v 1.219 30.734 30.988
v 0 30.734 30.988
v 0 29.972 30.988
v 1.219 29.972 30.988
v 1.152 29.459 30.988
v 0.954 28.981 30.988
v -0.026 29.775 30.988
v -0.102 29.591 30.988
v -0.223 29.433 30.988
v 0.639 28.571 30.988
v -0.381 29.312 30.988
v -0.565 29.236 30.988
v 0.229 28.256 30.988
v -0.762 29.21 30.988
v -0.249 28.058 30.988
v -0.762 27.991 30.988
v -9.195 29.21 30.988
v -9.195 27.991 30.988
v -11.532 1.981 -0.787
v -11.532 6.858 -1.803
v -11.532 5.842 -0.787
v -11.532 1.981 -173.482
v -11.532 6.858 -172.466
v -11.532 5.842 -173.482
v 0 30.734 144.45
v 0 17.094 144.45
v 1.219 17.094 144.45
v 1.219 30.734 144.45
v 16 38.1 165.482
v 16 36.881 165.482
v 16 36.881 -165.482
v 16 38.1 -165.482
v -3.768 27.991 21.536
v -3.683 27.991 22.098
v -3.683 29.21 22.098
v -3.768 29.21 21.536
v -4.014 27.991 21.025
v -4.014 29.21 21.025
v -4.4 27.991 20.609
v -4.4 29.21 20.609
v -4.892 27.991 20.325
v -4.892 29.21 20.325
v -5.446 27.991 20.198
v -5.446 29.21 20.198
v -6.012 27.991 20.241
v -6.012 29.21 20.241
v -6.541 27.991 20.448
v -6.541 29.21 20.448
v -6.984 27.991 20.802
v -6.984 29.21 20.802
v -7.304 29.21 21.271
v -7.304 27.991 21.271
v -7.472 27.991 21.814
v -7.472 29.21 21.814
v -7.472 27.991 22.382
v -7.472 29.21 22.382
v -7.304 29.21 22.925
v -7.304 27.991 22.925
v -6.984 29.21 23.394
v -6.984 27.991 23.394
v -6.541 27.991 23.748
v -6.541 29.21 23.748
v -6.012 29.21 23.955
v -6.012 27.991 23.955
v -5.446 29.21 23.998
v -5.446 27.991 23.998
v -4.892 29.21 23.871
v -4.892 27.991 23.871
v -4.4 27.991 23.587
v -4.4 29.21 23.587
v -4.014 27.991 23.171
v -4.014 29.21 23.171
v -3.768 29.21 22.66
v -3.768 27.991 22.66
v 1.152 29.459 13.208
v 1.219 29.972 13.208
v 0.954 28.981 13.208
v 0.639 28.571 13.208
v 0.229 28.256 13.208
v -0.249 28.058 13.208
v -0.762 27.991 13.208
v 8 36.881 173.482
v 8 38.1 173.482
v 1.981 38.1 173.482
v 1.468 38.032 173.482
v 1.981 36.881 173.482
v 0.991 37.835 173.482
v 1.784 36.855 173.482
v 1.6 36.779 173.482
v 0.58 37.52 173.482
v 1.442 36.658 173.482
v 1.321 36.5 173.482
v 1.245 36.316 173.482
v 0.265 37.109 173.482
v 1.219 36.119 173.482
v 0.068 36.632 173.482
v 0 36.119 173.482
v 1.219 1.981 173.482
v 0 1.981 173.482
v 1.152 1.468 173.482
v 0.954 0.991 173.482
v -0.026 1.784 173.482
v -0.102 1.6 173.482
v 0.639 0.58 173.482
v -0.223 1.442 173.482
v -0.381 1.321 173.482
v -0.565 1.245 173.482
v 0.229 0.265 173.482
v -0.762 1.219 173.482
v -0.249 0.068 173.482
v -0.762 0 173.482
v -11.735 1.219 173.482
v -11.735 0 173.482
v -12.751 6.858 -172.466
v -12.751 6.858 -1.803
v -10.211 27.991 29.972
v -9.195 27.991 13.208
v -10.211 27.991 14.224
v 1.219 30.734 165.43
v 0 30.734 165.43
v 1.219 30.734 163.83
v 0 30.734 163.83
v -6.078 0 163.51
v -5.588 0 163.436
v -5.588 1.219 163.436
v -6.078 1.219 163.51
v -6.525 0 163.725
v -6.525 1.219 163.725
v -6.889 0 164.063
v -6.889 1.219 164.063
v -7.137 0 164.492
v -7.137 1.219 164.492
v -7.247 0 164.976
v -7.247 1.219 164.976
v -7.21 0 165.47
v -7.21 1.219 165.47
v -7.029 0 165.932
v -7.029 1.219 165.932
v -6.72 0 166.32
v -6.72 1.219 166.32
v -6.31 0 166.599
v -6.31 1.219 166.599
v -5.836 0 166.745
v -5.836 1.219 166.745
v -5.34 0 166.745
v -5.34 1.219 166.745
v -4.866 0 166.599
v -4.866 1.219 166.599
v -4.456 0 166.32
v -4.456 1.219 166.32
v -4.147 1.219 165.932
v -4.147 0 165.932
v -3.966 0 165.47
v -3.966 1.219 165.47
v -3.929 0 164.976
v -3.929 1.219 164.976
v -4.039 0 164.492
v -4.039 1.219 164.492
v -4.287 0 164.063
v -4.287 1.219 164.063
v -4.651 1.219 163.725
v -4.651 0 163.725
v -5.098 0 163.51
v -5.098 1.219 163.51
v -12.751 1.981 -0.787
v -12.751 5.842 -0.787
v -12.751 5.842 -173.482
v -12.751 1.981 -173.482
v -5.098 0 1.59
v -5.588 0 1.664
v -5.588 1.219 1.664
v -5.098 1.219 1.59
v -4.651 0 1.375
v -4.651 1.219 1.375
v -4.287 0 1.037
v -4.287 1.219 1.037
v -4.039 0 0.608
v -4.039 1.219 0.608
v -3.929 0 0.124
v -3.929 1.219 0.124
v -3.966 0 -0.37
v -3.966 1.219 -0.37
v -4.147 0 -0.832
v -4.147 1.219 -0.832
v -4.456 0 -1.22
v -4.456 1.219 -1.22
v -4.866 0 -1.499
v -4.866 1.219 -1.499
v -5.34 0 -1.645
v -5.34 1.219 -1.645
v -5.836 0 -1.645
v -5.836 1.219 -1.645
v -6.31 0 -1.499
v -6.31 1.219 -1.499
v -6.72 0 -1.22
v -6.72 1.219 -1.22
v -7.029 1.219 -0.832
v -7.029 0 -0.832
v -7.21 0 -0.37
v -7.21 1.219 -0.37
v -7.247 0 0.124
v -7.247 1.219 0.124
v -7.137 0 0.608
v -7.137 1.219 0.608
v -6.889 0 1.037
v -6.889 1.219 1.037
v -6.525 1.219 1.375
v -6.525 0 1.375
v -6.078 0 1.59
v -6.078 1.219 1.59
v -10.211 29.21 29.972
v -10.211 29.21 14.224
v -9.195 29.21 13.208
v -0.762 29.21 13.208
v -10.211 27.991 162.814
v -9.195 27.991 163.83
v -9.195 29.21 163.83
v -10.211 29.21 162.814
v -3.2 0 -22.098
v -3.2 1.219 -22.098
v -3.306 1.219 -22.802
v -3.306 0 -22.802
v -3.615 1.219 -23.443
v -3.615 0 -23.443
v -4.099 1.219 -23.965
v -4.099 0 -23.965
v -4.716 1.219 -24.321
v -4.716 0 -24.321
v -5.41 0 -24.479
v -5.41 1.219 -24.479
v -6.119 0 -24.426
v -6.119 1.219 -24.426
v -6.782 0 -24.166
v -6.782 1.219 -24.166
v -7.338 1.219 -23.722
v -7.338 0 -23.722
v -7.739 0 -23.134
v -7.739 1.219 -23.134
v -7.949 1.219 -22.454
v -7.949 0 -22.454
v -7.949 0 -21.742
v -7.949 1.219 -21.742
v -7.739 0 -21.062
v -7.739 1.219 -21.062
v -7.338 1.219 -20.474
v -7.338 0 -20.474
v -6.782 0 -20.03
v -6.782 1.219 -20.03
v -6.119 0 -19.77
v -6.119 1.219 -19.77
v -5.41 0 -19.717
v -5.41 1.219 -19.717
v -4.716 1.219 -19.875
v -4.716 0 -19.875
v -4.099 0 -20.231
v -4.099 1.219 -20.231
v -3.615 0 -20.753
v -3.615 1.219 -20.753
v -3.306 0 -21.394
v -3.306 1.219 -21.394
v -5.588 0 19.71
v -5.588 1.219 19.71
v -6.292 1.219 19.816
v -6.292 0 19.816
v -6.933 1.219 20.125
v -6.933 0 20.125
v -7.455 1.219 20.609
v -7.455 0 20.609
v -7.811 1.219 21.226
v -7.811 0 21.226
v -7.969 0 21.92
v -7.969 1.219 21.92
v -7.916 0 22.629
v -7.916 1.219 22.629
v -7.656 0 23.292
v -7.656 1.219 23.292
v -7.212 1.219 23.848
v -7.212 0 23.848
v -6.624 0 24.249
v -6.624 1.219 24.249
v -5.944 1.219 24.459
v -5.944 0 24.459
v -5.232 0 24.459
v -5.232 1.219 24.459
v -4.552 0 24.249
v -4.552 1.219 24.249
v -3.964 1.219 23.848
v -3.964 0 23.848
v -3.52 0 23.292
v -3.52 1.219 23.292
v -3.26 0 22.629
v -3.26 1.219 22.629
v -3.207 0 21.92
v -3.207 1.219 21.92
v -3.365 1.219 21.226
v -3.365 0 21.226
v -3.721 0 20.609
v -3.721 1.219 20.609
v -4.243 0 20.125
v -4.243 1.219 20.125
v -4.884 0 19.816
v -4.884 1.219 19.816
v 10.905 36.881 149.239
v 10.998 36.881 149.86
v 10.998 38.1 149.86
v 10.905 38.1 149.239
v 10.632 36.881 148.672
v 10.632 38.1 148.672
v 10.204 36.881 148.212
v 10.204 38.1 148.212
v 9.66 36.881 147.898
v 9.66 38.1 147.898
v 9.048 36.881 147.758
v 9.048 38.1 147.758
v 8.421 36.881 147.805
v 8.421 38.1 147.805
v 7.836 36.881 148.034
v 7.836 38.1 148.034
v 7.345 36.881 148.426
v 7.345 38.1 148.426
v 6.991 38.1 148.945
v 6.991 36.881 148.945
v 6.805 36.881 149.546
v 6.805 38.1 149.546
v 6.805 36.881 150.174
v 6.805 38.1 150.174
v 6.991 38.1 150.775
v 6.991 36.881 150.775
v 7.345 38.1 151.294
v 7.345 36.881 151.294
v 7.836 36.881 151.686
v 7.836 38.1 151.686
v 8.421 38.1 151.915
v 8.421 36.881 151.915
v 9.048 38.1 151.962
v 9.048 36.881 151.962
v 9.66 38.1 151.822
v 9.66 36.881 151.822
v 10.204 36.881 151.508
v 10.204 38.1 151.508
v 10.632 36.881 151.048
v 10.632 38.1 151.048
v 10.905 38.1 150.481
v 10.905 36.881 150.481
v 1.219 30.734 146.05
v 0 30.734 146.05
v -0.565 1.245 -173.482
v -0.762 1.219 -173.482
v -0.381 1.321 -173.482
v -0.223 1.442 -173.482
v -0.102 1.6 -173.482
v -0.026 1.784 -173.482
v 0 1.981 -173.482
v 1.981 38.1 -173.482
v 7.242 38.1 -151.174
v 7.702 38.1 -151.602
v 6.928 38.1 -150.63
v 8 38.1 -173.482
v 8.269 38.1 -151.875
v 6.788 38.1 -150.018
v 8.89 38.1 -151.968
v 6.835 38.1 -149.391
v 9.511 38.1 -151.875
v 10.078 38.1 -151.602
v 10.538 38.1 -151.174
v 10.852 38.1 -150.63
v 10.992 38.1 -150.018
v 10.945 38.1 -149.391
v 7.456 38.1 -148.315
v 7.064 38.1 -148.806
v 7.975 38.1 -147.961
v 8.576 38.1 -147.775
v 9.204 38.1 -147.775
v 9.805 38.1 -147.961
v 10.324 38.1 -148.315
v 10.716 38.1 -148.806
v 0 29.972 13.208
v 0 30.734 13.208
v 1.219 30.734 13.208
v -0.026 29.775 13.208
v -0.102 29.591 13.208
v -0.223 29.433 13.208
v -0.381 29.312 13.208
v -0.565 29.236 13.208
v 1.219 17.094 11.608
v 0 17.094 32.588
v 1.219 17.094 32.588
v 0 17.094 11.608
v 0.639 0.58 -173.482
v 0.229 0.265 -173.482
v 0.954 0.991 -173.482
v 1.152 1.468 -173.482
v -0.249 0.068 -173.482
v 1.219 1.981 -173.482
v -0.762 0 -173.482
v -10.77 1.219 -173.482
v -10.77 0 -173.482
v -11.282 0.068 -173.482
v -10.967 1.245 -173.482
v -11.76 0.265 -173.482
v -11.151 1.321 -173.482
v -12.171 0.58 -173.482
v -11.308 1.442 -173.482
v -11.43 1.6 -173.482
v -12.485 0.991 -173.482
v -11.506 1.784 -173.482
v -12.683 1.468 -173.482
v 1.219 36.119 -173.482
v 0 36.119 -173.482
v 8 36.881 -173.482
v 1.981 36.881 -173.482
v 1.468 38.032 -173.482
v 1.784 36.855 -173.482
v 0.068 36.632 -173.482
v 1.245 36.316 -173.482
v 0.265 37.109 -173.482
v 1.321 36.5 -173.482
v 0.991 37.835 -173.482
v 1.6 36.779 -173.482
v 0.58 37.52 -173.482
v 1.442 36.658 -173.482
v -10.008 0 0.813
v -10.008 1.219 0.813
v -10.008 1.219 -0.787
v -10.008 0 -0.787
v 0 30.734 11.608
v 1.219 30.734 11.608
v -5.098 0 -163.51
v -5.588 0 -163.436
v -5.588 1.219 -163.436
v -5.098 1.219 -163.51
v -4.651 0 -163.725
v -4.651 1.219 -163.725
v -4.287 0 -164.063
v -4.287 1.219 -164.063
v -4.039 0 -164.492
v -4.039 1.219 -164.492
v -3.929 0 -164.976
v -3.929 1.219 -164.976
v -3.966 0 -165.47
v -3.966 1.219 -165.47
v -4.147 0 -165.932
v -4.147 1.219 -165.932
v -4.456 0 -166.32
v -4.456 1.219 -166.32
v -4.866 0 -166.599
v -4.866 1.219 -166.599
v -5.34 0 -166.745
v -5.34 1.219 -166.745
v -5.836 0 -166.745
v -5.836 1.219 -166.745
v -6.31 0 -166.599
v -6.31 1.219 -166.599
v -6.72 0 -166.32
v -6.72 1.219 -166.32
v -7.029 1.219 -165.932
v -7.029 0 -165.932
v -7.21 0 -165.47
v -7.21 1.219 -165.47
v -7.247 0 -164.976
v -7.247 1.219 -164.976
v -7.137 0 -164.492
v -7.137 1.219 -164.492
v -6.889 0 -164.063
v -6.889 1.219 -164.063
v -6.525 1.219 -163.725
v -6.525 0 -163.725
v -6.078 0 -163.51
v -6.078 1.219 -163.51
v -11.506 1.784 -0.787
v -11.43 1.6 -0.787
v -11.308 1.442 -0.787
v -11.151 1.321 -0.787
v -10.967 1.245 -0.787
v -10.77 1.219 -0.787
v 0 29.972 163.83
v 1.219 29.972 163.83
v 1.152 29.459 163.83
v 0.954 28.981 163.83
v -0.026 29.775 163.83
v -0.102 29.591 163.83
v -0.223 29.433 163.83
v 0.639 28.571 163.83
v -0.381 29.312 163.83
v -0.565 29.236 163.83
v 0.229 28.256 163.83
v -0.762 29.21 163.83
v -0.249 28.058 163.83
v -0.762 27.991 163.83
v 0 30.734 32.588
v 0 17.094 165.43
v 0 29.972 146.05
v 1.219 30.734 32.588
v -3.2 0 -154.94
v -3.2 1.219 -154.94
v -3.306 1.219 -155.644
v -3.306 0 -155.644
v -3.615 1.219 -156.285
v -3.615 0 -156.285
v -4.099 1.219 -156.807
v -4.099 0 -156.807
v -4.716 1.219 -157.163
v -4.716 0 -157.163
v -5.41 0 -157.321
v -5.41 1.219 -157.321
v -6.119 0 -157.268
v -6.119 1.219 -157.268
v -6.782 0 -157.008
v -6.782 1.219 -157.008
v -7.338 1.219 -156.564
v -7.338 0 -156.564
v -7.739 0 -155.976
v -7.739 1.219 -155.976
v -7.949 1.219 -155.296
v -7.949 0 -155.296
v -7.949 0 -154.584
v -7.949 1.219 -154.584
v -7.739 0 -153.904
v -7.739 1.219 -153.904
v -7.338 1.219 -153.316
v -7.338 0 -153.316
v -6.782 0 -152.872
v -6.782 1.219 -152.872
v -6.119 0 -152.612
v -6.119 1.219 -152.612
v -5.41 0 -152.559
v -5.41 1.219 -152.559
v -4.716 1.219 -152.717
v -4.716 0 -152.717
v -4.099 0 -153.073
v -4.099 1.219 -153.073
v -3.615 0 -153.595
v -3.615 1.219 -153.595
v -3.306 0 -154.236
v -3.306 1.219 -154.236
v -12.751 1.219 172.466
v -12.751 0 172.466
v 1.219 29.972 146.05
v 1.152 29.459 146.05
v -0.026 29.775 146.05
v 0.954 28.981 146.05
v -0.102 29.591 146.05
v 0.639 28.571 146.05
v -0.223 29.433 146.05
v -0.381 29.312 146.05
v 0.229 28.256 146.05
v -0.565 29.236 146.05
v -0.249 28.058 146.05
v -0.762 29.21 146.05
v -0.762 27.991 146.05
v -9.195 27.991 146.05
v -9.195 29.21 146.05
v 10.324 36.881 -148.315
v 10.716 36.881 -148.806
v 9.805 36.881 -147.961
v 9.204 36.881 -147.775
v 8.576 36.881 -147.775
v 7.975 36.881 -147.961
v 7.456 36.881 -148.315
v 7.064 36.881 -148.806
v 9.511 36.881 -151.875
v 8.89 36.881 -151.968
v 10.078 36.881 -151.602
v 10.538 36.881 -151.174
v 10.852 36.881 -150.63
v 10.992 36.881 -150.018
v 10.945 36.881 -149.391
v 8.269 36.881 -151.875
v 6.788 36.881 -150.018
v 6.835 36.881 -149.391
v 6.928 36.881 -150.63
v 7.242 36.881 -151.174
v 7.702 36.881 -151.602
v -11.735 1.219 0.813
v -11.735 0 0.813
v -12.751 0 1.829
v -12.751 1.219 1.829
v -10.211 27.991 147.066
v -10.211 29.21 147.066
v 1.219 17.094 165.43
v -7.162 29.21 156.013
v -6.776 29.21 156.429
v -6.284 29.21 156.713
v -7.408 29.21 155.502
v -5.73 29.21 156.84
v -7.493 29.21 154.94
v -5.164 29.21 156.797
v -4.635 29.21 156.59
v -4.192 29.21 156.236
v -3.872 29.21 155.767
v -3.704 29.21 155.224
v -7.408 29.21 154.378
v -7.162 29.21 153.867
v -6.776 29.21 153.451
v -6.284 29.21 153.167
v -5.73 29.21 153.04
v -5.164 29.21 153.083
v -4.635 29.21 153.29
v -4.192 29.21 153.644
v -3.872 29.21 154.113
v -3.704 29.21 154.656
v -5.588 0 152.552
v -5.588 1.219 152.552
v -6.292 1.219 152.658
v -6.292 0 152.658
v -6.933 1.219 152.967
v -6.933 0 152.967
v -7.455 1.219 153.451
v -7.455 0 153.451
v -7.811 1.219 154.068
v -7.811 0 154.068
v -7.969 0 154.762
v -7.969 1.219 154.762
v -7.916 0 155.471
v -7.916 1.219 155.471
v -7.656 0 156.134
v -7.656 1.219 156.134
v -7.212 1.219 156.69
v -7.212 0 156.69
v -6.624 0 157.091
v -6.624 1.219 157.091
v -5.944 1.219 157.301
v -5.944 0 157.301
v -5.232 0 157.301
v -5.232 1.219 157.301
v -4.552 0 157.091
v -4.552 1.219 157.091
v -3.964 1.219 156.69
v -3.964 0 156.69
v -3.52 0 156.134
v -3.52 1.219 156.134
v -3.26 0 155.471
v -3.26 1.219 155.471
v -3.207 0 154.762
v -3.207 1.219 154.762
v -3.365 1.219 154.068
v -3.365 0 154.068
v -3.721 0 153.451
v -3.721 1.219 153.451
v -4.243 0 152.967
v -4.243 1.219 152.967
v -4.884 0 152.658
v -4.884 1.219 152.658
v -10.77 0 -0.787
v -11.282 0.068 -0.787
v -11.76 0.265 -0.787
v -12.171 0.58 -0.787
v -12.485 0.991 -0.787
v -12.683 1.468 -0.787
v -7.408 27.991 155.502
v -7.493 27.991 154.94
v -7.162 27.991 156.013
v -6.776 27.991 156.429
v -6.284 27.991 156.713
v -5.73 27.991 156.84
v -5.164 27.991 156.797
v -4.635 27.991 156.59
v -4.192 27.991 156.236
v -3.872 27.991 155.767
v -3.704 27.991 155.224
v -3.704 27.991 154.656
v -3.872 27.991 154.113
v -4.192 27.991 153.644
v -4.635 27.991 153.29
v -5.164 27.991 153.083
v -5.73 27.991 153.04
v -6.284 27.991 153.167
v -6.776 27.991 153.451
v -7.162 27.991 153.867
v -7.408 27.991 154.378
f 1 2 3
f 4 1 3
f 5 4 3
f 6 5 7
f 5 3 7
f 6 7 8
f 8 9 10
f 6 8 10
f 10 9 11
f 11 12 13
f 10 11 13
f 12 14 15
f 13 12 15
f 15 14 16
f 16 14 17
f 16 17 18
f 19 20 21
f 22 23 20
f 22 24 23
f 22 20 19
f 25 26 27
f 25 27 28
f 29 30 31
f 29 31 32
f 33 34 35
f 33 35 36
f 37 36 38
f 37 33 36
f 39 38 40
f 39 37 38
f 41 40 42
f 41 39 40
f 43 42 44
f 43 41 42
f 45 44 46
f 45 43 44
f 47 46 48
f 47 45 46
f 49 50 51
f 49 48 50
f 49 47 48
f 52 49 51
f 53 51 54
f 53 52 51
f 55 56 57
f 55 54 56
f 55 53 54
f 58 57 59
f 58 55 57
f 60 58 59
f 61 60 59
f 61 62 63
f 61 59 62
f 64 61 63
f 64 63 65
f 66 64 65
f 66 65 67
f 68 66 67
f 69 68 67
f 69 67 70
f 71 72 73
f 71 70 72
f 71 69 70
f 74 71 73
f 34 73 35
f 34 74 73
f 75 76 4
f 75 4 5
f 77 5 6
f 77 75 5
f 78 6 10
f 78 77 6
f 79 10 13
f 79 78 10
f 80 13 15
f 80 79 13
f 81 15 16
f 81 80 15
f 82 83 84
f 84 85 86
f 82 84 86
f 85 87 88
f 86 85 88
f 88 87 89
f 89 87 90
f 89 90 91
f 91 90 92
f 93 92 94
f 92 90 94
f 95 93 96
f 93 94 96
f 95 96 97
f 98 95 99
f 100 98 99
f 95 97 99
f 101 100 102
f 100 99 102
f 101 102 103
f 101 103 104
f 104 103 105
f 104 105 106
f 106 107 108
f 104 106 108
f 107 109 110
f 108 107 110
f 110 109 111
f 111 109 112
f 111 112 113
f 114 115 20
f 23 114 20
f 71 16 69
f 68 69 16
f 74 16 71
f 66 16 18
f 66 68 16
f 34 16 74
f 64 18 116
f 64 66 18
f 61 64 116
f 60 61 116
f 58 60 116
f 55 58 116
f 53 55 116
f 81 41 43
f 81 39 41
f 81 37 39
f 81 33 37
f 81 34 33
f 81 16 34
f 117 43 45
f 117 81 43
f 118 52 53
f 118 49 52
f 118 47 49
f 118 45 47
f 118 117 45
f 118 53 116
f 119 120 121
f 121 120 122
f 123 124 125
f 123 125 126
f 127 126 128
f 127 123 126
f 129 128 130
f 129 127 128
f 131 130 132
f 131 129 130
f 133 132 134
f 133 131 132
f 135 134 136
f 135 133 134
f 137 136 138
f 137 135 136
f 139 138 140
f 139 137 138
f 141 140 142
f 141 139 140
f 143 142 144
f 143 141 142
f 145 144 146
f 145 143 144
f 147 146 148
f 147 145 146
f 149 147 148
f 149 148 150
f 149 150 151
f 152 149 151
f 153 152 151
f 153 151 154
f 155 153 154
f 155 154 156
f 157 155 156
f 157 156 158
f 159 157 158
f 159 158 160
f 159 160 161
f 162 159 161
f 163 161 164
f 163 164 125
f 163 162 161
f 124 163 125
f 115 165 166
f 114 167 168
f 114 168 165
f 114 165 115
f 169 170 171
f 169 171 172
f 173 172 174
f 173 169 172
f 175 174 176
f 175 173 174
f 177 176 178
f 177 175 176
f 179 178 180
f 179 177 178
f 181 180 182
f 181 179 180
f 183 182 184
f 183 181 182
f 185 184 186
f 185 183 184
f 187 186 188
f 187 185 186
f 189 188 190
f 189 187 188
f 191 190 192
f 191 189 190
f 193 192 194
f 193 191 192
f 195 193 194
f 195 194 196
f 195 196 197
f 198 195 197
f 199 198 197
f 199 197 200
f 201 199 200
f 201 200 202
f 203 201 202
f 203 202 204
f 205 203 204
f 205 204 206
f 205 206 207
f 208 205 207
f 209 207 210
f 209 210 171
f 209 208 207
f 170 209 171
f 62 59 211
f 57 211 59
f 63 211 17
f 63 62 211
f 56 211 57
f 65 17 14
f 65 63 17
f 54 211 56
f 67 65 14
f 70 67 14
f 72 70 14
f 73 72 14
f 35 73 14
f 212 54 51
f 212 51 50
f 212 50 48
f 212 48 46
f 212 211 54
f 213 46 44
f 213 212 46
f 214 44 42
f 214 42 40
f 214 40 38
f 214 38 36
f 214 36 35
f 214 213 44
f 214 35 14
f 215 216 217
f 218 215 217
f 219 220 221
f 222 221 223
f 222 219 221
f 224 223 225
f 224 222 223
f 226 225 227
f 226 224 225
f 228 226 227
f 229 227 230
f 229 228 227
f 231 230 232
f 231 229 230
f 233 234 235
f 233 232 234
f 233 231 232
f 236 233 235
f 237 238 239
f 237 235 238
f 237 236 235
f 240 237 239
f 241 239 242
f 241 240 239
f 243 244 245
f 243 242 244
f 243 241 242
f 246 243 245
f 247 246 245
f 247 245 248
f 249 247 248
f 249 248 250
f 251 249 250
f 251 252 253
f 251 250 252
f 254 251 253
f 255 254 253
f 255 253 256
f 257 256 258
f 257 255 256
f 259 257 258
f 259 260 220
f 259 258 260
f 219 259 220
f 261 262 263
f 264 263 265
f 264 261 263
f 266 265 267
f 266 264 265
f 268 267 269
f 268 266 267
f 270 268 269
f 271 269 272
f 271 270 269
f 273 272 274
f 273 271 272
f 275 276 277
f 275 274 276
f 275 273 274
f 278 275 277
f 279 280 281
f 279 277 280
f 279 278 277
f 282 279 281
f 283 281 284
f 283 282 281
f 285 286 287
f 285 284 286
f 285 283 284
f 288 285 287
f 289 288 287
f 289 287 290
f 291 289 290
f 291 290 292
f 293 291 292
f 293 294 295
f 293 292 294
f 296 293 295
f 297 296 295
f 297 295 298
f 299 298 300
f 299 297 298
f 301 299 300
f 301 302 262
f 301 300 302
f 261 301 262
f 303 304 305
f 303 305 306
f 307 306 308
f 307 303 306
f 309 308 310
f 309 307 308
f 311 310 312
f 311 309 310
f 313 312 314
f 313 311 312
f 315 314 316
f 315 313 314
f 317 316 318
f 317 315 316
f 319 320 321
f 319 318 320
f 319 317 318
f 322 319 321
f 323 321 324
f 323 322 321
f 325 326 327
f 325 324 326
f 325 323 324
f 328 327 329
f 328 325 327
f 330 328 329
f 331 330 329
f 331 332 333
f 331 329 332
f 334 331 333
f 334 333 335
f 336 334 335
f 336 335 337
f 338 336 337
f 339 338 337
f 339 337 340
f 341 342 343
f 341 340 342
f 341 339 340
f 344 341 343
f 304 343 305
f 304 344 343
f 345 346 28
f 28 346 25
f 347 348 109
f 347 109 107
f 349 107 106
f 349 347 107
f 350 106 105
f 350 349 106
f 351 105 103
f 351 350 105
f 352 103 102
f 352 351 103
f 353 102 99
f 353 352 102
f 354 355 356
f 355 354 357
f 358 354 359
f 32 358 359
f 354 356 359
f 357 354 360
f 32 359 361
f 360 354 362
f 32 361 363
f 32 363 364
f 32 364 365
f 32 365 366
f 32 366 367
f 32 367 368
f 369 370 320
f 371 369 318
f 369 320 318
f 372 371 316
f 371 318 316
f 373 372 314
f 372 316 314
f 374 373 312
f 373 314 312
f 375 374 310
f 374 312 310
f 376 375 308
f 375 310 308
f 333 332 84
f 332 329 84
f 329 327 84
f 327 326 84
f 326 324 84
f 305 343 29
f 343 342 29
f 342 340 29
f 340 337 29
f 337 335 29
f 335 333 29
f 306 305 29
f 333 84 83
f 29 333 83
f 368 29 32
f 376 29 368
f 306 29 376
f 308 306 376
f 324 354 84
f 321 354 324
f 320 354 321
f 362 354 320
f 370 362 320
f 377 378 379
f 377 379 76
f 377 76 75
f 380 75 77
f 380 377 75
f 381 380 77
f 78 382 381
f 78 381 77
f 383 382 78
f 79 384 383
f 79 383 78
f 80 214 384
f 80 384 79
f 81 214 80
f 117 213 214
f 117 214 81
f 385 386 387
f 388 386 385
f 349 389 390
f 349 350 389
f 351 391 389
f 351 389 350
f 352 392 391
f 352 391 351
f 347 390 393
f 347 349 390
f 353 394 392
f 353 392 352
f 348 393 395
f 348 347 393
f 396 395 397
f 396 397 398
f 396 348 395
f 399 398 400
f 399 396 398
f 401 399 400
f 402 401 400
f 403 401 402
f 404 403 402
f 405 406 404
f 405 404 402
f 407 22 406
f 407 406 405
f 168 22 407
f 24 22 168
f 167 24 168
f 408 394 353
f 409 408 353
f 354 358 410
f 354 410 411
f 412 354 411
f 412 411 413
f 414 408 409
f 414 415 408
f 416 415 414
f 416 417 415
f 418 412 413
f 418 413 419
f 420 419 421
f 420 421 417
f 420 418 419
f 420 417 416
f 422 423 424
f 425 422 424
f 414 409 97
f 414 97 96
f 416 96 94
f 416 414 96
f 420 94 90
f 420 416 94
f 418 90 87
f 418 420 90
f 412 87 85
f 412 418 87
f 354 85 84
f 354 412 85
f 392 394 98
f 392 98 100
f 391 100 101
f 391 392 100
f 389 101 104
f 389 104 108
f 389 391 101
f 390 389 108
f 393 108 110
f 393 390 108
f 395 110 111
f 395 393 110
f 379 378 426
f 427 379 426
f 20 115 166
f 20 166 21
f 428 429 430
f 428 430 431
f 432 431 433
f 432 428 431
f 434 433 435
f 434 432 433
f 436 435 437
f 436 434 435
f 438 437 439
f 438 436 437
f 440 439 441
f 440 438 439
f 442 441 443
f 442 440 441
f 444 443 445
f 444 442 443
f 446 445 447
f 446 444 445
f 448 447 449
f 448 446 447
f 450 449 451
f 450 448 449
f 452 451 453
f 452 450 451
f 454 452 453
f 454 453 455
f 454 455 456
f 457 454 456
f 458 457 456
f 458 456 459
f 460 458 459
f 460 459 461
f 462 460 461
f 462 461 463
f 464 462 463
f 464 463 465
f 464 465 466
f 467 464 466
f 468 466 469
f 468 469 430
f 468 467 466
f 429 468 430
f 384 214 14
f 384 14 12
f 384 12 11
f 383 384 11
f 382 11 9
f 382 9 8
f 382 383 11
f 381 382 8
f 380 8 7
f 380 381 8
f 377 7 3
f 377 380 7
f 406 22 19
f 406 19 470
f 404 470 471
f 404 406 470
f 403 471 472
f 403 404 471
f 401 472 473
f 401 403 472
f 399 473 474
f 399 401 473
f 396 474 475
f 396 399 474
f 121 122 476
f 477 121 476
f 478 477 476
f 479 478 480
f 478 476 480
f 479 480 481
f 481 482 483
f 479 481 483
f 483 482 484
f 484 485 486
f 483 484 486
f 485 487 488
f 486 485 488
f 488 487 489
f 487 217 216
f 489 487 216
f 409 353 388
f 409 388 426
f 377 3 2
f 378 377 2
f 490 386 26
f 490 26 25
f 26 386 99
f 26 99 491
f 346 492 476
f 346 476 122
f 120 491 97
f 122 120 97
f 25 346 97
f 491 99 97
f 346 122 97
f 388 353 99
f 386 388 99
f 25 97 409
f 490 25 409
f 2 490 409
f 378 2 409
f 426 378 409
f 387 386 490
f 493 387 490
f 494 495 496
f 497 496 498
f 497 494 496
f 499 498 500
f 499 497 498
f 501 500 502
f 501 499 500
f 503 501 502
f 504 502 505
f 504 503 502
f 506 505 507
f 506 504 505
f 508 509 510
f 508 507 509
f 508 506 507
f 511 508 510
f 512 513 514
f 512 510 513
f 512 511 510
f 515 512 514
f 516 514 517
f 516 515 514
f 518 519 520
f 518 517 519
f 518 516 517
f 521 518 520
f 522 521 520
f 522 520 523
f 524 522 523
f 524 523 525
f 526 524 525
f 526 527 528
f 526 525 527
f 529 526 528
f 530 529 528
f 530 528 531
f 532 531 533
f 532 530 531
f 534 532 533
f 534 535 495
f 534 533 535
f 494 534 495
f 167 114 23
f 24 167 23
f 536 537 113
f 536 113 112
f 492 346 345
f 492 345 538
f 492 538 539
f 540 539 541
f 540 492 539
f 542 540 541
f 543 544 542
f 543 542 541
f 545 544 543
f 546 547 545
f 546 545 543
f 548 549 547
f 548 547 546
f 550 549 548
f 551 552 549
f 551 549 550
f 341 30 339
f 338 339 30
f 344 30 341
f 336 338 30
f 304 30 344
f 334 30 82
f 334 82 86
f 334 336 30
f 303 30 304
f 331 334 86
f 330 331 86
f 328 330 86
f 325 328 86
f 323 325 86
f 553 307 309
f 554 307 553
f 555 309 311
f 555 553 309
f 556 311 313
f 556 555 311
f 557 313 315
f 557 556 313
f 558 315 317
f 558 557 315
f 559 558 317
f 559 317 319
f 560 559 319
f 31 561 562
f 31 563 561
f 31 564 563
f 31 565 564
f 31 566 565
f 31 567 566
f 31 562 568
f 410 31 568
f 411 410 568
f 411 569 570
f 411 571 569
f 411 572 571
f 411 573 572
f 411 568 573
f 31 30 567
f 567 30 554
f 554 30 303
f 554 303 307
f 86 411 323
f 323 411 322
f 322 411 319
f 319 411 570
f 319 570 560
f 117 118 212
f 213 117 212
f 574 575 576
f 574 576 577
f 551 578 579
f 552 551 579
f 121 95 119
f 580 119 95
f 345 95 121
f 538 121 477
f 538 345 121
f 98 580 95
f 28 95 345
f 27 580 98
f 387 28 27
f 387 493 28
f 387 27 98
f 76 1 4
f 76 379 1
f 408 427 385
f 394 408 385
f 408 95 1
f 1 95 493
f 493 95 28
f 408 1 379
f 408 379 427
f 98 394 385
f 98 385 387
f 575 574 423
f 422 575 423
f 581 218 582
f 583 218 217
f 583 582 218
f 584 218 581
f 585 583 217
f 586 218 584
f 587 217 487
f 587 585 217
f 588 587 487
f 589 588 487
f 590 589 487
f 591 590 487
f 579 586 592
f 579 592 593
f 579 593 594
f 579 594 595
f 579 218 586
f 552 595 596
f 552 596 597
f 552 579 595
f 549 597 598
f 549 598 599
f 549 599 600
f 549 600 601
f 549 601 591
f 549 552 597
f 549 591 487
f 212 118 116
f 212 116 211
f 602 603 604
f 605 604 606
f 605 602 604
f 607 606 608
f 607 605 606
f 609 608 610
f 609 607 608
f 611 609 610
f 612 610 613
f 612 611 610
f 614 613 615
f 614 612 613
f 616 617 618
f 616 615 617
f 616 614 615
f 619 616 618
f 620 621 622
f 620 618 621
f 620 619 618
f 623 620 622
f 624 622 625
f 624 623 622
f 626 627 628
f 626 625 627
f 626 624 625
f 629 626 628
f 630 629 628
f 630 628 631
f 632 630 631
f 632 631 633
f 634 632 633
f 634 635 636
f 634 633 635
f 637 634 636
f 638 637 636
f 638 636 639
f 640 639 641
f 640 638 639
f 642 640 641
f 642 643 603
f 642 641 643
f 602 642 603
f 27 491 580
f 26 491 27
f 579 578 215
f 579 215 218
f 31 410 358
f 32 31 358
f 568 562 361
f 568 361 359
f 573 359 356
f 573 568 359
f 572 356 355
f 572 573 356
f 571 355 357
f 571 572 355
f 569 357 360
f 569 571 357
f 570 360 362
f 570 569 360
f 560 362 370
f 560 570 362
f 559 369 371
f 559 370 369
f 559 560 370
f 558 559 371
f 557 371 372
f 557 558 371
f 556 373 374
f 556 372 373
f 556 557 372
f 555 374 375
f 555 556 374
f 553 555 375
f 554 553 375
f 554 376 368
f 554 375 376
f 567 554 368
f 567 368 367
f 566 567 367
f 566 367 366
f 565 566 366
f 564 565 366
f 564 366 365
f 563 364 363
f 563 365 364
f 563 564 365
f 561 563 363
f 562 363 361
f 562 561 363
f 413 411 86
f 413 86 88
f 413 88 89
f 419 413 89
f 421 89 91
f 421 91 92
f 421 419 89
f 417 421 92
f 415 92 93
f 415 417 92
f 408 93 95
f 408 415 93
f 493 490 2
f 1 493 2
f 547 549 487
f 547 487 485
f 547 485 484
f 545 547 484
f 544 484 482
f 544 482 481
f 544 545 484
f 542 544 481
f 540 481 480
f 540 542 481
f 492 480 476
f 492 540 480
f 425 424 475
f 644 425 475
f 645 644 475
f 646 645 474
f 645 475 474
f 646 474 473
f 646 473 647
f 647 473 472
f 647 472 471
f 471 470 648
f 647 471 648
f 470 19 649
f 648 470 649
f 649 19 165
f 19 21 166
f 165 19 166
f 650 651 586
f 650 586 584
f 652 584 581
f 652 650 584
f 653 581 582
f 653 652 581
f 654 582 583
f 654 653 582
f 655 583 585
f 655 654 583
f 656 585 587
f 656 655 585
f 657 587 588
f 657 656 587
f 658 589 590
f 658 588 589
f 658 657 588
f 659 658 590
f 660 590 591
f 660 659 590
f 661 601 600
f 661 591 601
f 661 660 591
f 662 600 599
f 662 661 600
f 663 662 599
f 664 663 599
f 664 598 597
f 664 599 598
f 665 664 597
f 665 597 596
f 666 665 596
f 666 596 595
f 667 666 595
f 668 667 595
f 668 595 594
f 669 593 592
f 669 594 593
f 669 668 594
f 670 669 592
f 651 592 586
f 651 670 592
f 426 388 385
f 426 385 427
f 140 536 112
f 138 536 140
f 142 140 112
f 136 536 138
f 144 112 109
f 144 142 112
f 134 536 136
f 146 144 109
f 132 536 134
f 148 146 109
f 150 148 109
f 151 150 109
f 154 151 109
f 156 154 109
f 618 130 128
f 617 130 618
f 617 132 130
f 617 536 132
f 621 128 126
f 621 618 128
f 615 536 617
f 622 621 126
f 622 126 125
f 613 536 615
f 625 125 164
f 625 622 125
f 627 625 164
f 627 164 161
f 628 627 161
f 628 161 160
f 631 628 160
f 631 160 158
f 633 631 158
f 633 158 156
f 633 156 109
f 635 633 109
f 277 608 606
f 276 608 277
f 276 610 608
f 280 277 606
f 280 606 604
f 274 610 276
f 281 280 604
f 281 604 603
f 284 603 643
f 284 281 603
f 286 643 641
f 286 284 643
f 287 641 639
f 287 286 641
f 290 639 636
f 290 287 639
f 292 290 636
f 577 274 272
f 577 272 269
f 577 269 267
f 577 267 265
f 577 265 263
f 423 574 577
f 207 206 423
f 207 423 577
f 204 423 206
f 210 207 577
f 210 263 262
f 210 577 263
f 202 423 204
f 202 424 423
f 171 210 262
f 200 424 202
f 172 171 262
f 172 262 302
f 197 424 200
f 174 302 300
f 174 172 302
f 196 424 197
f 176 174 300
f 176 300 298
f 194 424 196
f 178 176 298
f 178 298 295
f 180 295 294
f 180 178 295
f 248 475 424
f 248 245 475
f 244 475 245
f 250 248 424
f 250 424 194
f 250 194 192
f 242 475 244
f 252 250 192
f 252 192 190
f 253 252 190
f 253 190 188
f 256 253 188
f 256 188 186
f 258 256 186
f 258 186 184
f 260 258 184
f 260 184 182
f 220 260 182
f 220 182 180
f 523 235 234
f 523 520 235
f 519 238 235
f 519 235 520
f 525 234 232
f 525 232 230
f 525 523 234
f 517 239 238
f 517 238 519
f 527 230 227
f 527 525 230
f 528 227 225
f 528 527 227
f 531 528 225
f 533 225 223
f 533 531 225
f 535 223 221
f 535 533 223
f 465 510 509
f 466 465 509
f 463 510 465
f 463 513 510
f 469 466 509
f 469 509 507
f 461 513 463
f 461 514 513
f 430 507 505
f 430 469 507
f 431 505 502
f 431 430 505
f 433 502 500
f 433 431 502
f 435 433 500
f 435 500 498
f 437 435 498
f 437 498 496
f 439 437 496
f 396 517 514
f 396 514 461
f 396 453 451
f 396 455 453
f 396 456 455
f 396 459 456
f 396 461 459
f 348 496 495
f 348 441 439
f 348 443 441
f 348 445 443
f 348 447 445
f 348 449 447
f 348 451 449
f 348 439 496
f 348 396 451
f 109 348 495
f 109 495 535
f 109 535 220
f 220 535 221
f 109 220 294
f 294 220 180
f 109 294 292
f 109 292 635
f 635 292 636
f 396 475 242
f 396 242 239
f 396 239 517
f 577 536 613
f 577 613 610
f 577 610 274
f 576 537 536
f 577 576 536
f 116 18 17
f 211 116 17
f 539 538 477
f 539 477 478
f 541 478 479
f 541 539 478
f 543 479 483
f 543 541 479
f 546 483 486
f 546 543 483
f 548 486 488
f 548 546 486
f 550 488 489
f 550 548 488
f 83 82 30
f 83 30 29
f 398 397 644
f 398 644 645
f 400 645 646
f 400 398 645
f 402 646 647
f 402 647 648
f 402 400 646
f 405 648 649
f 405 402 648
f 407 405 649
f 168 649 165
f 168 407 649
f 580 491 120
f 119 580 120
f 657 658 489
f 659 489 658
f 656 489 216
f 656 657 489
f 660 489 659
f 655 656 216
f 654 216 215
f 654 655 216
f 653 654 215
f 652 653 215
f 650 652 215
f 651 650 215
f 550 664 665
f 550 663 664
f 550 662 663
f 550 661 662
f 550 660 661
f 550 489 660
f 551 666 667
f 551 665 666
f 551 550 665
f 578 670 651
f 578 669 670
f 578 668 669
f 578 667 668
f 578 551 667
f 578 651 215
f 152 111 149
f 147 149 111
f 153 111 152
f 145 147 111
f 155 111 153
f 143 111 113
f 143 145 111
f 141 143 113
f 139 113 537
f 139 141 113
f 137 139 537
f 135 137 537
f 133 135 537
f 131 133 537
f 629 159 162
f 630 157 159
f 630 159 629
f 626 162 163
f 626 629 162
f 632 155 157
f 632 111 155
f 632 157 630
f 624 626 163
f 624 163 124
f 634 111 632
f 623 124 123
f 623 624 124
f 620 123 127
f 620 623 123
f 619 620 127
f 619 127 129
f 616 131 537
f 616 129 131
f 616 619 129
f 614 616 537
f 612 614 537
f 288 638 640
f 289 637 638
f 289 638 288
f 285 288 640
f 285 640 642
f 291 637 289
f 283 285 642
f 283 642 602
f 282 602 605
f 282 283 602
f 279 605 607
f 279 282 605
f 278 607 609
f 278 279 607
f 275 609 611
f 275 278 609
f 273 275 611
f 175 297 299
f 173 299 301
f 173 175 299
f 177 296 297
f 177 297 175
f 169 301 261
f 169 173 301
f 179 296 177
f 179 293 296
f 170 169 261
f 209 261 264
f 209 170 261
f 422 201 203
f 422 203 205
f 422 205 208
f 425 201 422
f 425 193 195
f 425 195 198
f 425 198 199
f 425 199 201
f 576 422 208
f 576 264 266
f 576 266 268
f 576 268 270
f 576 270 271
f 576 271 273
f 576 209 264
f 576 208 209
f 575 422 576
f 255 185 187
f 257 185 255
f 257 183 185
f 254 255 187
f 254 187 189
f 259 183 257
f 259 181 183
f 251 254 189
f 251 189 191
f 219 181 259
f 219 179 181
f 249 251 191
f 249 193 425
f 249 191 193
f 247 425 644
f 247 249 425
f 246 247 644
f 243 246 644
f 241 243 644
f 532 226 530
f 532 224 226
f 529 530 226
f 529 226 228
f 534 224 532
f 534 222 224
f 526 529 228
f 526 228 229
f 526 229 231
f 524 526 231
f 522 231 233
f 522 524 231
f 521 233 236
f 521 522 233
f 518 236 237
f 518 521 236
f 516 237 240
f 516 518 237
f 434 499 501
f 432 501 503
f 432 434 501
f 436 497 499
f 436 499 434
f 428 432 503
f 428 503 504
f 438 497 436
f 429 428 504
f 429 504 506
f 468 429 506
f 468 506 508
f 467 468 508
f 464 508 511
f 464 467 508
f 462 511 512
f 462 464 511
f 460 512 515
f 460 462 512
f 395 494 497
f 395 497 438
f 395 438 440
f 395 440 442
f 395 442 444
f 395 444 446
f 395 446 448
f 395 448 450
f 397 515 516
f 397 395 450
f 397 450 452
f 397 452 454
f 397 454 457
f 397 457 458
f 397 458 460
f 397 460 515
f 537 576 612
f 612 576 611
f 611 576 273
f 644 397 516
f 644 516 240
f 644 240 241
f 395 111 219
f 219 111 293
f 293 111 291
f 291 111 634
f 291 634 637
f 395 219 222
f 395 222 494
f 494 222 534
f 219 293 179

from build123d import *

# Parameters (mm, degrees)
SKETCH2_W                            = 16
SKETCH2_H                            = 38.1
BOSS_EXTRUDE1_DEPTH                  = 173.482
CONVERT_SOLID1_START                 = -173.482
CONVERT_SOLID1_DEPTH                 = 346.964
EDGE_FLANGE2_STRIP_W                 = 6.4008
EDGE_FLANGE2_STRIP_H                 = 1.2192
EDGE_FLANGE2_STRIP_CUT_DEPTH         = 346.964
EDGE_FLANGE2_DEPTH                   = 346.964
EDGE_FLANGE3_STRIP_W                 = 6.4008
EDGE_FLANGE3_STRIP_H                 = 1.2192
EDGE_FLANGE3_STRIP_CUT_DEPTH         = 172.6946
EDGE_FLANGE3_RELIEF_W                = 7.1628
EDGE_FLANGE3_RELIEF_H                = 1.6002
EDGE_FLANGE3_RELIEF_CUT_DEPTH        = 1.2192
EDGE_FLANGE3_DEPTH                   = 172.6946
PEM_CLEARANCE_HOLES_R                = 2.3876
CUT_EXTRUDE4_DEPTH                   = 179.335678775
TOP_PLATE_ATTACHMENT_PEM_HOLES_R     = 2.1082
CUT_EXTRUDE5_DEPTH                   = 179.335678775
CHAMFER2_SIZE                        = 8
SKETCH17_W                           = 20.9804
SKETCH17_H                           = 12.1158
CUT_EXTRUDE7_DEPTH                   = 1.2192
EDGE_FLANGE4_STRIP_W                 = 6.4008
EDGE_FLANGE4_STRIP_H                 = 1.2192
EDGE_FLANGE4_STRIP_CUT_DEPTH         = 17.78
EDGE_FLANGE4_RELIEF_W                = 7.1628
EDGE_FLANGE4_RELIEF_H                = 1.6002
EDGE_FLANGE4_RELIEF_CUT_DEPTH        = 1.2192
EDGE_FLANGE4_STRIP_2_W               = 6.4008
EDGE_FLANGE4_STRIP_2_H               = 1.2192
EDGE_FLANGE4_STRIP_CUT_2_DEPTH       = 17.78
EDGE_FLANGE4_RELIEF_2_W              = 7.1628
EDGE_FLANGE4_RELIEF_2_H              = 1.6002
EDGE_FLANGE4_RELIEF_CUT_2_DEPTH      = 1.2192
EDGE_FLANGE4_DEPTH                   = 17.78
EDGE_FLANGE4_BEND_DEPTH              = 17.78
BASE_MOUNTING_RIVET_CLAMPING_HOLES_R = 1.6637
CUT_EXTRUDE8_DEPTH                   = 1.2192
SKETCH29_R                           = 1.905
CUT_EXTRUDE11_DEPTH                  = 179.335678775
CHAMFER3_SIZE                        = 1.016


# Read off the part's stored shape, not the designer's step: Convert-Solid1
# Sheet-metal steps are written as plain solids
with BuildPart() as part:
    # Sketch2 → Boss-Extrude1 (new, symmetric)
    with BuildSketch(Plane.XY):
        with Locations((8, 19.05)):
            Rectangle(SKETCH2_W, SKETCH2_H)
    extrude(amount=BOSS_EXTRUDE1_DEPTH, both=True)

    # Convert-Solid1 outline → Convert-Solid1 (cut)
    with BuildSketch(Plane.XY.offset(CONVERT_SOLID1_START)):
        with BuildLine():
            Line((0, 38.1), (0, 36.1188))
            ThreePointArc((0, 36.1188), (0.580280045, 37.519719955), (1.9812, 38.1))
            Line((1.9812, 38.1), (0, 38.1))
        make_face()
        with BuildLine():
            Line((1.2192, 36.1188), (1.2192, 0))
            Line((1.2192, 0), (16, 0))
            Line((16, 0), (16, 36.8808))
            Line((16, 36.8808), (1.9812, 36.8808))
            ThreePointArc((1.9812, 36.8808), (1.442384633, 36.657615367), (1.2192, 36.1188))
        make_face()
    extrude(amount=CONVERT_SOLID1_DEPTH, mode=Mode.SUBTRACT)

    # Edge-Flange2 strip (across the edge) → Edge-Flange2 strip cut (cut)
    with BuildSketch(Plane(origin=(0, 0, -173.482), x_dir=(0, 1, 0), z_dir=(0, 0, 1))):
        with Locations((-1.2192, -0.6096)):
            Rectangle(EDGE_FLANGE2_STRIP_W, EDGE_FLANGE2_STRIP_H)
    extrude(amount=EDGE_FLANGE2_STRIP_CUT_DEPTH, mode=Mode.SUBTRACT)

    # Edge-Flange2 section (across the edge) → Edge-Flange2 (add)
    with BuildSketch(Plane(origin=(0, 0, -173.482), x_dir=(0, 1, 0), z_dir=(0, 0, 1))):
        with BuildLine():
            Line((0, 0.762), (0, 12.7508))
            Line((0, 12.7508), (1.2192, 12.7508))
            Line((1.2192, 12.7508), (1.2192, 0.762))
            ThreePointArc((1.2192, 0.762), (1.442384633, 0.223184633), (1.9812, 0))
            Line((1.9812, 0), (1.9812, -1.2192))
            ThreePointArc((1.9812, -1.2192), (0.580280045, -0.638919955), (0, 0.762))
        make_face()
    extrude(amount=EDGE_FLANGE2_DEPTH)

    # Edge-Flange3 strip (across the edge) → Edge-Flange3 strip cut (cut)
    with BuildSketch(Plane(origin=(-12.7508, 1.2192, -173.482), x_dir=(1, 0, 0), z_dir=(0, 0, 1))):
        with Locations((-1.2192, -0.6096)):
            Rectangle(EDGE_FLANGE3_STRIP_W, EDGE_FLANGE3_STRIP_H)
    extrude(amount=EDGE_FLANGE3_STRIP_CUT_DEPTH, mode=Mode.SUBTRACT)

    # Edge-Flange3 relief (on the sheet) → Edge-Flange3 relief cut (cut)
    with BuildSketch(Plane(origin=(-10.7696, 1.2192, -173.482), x_dir=(1, 0, 0), z_dir=(0, 1, 0))):
        with Locations((-2.8194, -173.4947)):
            Rectangle(EDGE_FLANGE3_RELIEF_W, EDGE_FLANGE3_RELIEF_H)
    extrude(amount=-EDGE_FLANGE3_RELIEF_CUT_DEPTH, mode=Mode.SUBTRACT)

    # Edge-Flange3 section (across the edge) → Edge-Flange3 (add)
    with BuildSketch(Plane(origin=(-12.7508, 1.2192, -173.482), x_dir=(1, 0, 0), z_dir=(0, 0, 1))):
        with BuildLine():
            Line((0, 0.762), (0, 5.6388))
            Line((0, 5.6388), (1.2192, 5.6388))
            Line((1.2192, 5.6388), (1.2192, 0.762))
            ThreePointArc((1.2192, 0.762), (1.442384633, 0.223184633), (1.9812, 0))
            Line((1.9812, 0), (1.9812, -1.2192))
            ThreePointArc((1.9812, -1.2192), (0.580280045, -0.638919955), (0, 0.762))
        make_face()
    extrude(amount=EDGE_FLANGE3_DEPTH)

    # PEM Clearance Holes → Cut-Extrude4 (cut, through all)
    with BuildSketch(Plane(origin=(0, 0, 0), x_dir=(1, 0, 0), z_dir=(0, 1, 0))):
        with Locations((-5.588, 22.098)):
            Circle(PEM_CLEARANCE_HOLES_R)
        with Locations((-5.588, 154.94)):
            Circle(PEM_CLEARANCE_HOLES_R)
        with Locations(Location((-5.588, -154.94, 0), (0, 0, 90))):
            Circle(PEM_CLEARANCE_HOLES_R)
        with Locations(Location((-5.588, -22.098, 0), (0, 0, 90))):
            Circle(PEM_CLEARANCE_HOLES_R)
    extrude(amount=CUT_EXTRUDE4_DEPTH, mode=Mode.SUBTRACT)

    # Top Plate Attachment PEM Holes → Cut-Extrude5 (cut, through all)
    with BuildSketch(Plane(origin=(0, 0, 0), x_dir=(1, 0, 0), z_dir=(0, 1, 0))):
        with Locations((8.89, -149.86)):
            Circle(TOP_PLATE_ATTACHMENT_PEM_HOLES_R)
        with Locations(Location((8.89, 149.86, 0), (0, 0, 90))):
            Circle(TOP_PLATE_ATTACHMENT_PEM_HOLES_R)
    extrude(amount=CUT_EXTRUDE5_DEPTH, mode=Mode.SUBTRACT)

    # Chamfer2
    chamfer2_edges = [part.edges().sort_by_distance(p)[0] for p in [
        (16, 37.4904, -173.482),
        (16, 37.4904, 173.482),
    ]]
    chamfer(chamfer2_edges, length=CHAMFER2_SIZE)

    # Sketch17 → Cut-Extrude7 (cut)
    with BuildSketch(Plane(origin=(0, 0, 0), x_dir=(0, 0, -1), z_dir=(1, 0, 0))):
        with Locations((-22.098, 23.1521)):
            Rectangle(SKETCH17_W, SKETCH17_H)
        with Locations((-154.94, 23.1521)):
            Rectangle(SKETCH17_W, SKETCH17_H)
    extrude(amount=CUT_EXTRUDE7_DEPTH, mode=Mode.SUBTRACT)

    # Edge-Flange4 strip (across the edge) → Edge-Flange4 strip cut (cut)
    with BuildSketch(Plane(origin=(0, 29.21, 13.208), x_dir=(0, 1, 0), z_dir=(0, 0, 1))):
        with Locations((-2.4384, -0.6096)):
            Rectangle(EDGE_FLANGE4_STRIP_W, EDGE_FLANGE4_STRIP_H)
    extrude(amount=EDGE_FLANGE4_STRIP_CUT_DEPTH, mode=Mode.SUBTRACT)

    # Edge-Flange4 relief (on the sheet) → Edge-Flange4 relief cut (cut)
    with BuildSketch(Plane(origin=(0, 29.972, 13.208), x_dir=(0, 1, 0), z_dir=(-1, 0, 0))):
        with Locations((-2.8194, 0.8001)):
            Rectangle(EDGE_FLANGE4_RELIEF_W, EDGE_FLANGE4_RELIEF_H)
        with Locations((-2.8194, -18.5801)):
            Rectangle(EDGE_FLANGE4_RELIEF_W, EDGE_FLANGE4_RELIEF_H)
    extrude(amount=-EDGE_FLANGE4_RELIEF_CUT_DEPTH, mode=Mode.SUBTRACT)

    # Edge-Flange4 strip 2 (across the edge) → Edge-Flange4 strip cut 2 (cut)
    with BuildSketch(Plane(origin=(0, 29.21, 146.05), x_dir=(0, 1, 0), z_dir=(0, 0, 1))):
        with Locations((-2.4384, -0.6096)):
            Rectangle(EDGE_FLANGE4_STRIP_2_W, EDGE_FLANGE4_STRIP_2_H)
    extrude(amount=EDGE_FLANGE4_STRIP_CUT_2_DEPTH, mode=Mode.SUBTRACT)

    # Edge-Flange4 relief 2 (on the sheet) → Edge-Flange4 relief cut 2 (cut)
    with BuildSketch(Plane(origin=(0, 29.972, 146.05), x_dir=(0, 1, 0), z_dir=(-1, 0, 0))):
        with Locations((-2.8194, 0.8001)):
            Rectangle(EDGE_FLANGE4_RELIEF_2_W, EDGE_FLANGE4_RELIEF_2_H)
        with Locations((-2.8194, -18.5801)):
            Rectangle(EDGE_FLANGE4_RELIEF_2_W, EDGE_FLANGE4_RELIEF_2_H)
    extrude(amount=-EDGE_FLANGE4_RELIEF_CUT_2_DEPTH, mode=Mode.SUBTRACT)

    # Edge-Flange4 section (across the edge) → Edge-Flange4 (add)
    with BuildSketch(Plane(origin=(0, 29.21, 13.208), x_dir=(0, 1, 0), z_dir=(0, 0, 1))):
        with BuildLine():
            Line((-1.2192, 0.762), (-1.2192, 10.2108))
            Line((-1.2192, 10.2108), (0, 10.2108))
            Line((0, 10.2108), (0, 0.762))
            ThreePointArc((0, 0.762), (0.223184633, 0.223184633), (0.762, 0))
            Line((0.762, 0), (0.762, -1.2192))
            ThreePointArc((0.762, -1.2192), (-0.638919955, -0.638919955), (-1.2192, 0.762))
        make_face()
    extrude(amount=EDGE_FLANGE4_DEPTH)

    # Edge-Flange4 section 2 (across the edge) → Edge-Flange4 bend (add)
    with BuildSketch(Plane(origin=(0, 29.21, 146.05), x_dir=(0, 1, 0), z_dir=(0, 0, 1))):
        with BuildLine():
            Line((-1.2192, 0.762), (-1.2192, 10.2108))
            Line((-1.2192, 10.2108), (0, 10.2108))
            Line((0, 10.2108), (0, 0.762))
            ThreePointArc((0, 0.762), (0.223184633, 0.223184633), (0.762, 0))
            Line((0.762, 0), (0.762, -1.2192))
            ThreePointArc((0.762, -1.2192), (-0.638919955, -0.638919955), (-1.2192, 0.762))
        make_face()
    extrude(amount=EDGE_FLANGE4_BEND_DEPTH)

    # Base Mounting Rivet Clamping Holes → Cut-Extrude8 (cut)
    with BuildSketch(Plane(origin=(0, 0, 0), x_dir=(1, 0, 0), z_dir=(0, 1, 0))):
        with Locations(Location((-5.588, -165.1, 0), (0, 0, 90))):
            Circle(BASE_MOUNTING_RIVET_CLAMPING_HOLES_R)
        with Locations(Location((-5.588, 0, 0), (0, 0, 270))):
            Circle(BASE_MOUNTING_RIVET_CLAMPING_HOLES_R)
        with Locations(Location((-5.588, 165.1, 0), (0, 0, 270))):
            Circle(BASE_MOUNTING_RIVET_CLAMPING_HOLES_R)
    extrude(amount=CUT_EXTRUDE8_DEPTH, mode=Mode.SUBTRACT)

    # Sketch29 → Cut-Extrude11 (cut, through all)
    with BuildSketch(Plane(origin=(0, 0, 0), x_dir=(1, 0, 0), z_dir=(0, 1, 0))):
        with Locations((-5.588, -22.098)):
            Circle(SKETCH29_R)
        with Locations(Location((-5.588, -154.94, 0), (0, 0, 180))):
            Circle(SKETCH29_R)
    extrude(amount=CUT_EXTRUDE11_DEPTH, mode=Mode.SUBTRACT)

    # Chamfer3
    chamfer3_edges = [part.edges().sort_by_distance(p)[0] for p in [
        (-10.2108, 28.6004, 13.208),
        (-10.2108, 28.6004, 30.988),
        (-10.2108, 28.6004, 146.05),
        (-10.2108, 28.6004, 163.83),
        (-12.7508, 0.6096, 173.482),
        (-12.7508, 0.6096, 0.8128),
        (-12.1412, 6.858, -173.482),
        (-12.1412, 6.858, -0.7874),
    ]]
    chamfer(chamfer3_edges, length=CHAMFER3_SIZE)


solid = part.part
